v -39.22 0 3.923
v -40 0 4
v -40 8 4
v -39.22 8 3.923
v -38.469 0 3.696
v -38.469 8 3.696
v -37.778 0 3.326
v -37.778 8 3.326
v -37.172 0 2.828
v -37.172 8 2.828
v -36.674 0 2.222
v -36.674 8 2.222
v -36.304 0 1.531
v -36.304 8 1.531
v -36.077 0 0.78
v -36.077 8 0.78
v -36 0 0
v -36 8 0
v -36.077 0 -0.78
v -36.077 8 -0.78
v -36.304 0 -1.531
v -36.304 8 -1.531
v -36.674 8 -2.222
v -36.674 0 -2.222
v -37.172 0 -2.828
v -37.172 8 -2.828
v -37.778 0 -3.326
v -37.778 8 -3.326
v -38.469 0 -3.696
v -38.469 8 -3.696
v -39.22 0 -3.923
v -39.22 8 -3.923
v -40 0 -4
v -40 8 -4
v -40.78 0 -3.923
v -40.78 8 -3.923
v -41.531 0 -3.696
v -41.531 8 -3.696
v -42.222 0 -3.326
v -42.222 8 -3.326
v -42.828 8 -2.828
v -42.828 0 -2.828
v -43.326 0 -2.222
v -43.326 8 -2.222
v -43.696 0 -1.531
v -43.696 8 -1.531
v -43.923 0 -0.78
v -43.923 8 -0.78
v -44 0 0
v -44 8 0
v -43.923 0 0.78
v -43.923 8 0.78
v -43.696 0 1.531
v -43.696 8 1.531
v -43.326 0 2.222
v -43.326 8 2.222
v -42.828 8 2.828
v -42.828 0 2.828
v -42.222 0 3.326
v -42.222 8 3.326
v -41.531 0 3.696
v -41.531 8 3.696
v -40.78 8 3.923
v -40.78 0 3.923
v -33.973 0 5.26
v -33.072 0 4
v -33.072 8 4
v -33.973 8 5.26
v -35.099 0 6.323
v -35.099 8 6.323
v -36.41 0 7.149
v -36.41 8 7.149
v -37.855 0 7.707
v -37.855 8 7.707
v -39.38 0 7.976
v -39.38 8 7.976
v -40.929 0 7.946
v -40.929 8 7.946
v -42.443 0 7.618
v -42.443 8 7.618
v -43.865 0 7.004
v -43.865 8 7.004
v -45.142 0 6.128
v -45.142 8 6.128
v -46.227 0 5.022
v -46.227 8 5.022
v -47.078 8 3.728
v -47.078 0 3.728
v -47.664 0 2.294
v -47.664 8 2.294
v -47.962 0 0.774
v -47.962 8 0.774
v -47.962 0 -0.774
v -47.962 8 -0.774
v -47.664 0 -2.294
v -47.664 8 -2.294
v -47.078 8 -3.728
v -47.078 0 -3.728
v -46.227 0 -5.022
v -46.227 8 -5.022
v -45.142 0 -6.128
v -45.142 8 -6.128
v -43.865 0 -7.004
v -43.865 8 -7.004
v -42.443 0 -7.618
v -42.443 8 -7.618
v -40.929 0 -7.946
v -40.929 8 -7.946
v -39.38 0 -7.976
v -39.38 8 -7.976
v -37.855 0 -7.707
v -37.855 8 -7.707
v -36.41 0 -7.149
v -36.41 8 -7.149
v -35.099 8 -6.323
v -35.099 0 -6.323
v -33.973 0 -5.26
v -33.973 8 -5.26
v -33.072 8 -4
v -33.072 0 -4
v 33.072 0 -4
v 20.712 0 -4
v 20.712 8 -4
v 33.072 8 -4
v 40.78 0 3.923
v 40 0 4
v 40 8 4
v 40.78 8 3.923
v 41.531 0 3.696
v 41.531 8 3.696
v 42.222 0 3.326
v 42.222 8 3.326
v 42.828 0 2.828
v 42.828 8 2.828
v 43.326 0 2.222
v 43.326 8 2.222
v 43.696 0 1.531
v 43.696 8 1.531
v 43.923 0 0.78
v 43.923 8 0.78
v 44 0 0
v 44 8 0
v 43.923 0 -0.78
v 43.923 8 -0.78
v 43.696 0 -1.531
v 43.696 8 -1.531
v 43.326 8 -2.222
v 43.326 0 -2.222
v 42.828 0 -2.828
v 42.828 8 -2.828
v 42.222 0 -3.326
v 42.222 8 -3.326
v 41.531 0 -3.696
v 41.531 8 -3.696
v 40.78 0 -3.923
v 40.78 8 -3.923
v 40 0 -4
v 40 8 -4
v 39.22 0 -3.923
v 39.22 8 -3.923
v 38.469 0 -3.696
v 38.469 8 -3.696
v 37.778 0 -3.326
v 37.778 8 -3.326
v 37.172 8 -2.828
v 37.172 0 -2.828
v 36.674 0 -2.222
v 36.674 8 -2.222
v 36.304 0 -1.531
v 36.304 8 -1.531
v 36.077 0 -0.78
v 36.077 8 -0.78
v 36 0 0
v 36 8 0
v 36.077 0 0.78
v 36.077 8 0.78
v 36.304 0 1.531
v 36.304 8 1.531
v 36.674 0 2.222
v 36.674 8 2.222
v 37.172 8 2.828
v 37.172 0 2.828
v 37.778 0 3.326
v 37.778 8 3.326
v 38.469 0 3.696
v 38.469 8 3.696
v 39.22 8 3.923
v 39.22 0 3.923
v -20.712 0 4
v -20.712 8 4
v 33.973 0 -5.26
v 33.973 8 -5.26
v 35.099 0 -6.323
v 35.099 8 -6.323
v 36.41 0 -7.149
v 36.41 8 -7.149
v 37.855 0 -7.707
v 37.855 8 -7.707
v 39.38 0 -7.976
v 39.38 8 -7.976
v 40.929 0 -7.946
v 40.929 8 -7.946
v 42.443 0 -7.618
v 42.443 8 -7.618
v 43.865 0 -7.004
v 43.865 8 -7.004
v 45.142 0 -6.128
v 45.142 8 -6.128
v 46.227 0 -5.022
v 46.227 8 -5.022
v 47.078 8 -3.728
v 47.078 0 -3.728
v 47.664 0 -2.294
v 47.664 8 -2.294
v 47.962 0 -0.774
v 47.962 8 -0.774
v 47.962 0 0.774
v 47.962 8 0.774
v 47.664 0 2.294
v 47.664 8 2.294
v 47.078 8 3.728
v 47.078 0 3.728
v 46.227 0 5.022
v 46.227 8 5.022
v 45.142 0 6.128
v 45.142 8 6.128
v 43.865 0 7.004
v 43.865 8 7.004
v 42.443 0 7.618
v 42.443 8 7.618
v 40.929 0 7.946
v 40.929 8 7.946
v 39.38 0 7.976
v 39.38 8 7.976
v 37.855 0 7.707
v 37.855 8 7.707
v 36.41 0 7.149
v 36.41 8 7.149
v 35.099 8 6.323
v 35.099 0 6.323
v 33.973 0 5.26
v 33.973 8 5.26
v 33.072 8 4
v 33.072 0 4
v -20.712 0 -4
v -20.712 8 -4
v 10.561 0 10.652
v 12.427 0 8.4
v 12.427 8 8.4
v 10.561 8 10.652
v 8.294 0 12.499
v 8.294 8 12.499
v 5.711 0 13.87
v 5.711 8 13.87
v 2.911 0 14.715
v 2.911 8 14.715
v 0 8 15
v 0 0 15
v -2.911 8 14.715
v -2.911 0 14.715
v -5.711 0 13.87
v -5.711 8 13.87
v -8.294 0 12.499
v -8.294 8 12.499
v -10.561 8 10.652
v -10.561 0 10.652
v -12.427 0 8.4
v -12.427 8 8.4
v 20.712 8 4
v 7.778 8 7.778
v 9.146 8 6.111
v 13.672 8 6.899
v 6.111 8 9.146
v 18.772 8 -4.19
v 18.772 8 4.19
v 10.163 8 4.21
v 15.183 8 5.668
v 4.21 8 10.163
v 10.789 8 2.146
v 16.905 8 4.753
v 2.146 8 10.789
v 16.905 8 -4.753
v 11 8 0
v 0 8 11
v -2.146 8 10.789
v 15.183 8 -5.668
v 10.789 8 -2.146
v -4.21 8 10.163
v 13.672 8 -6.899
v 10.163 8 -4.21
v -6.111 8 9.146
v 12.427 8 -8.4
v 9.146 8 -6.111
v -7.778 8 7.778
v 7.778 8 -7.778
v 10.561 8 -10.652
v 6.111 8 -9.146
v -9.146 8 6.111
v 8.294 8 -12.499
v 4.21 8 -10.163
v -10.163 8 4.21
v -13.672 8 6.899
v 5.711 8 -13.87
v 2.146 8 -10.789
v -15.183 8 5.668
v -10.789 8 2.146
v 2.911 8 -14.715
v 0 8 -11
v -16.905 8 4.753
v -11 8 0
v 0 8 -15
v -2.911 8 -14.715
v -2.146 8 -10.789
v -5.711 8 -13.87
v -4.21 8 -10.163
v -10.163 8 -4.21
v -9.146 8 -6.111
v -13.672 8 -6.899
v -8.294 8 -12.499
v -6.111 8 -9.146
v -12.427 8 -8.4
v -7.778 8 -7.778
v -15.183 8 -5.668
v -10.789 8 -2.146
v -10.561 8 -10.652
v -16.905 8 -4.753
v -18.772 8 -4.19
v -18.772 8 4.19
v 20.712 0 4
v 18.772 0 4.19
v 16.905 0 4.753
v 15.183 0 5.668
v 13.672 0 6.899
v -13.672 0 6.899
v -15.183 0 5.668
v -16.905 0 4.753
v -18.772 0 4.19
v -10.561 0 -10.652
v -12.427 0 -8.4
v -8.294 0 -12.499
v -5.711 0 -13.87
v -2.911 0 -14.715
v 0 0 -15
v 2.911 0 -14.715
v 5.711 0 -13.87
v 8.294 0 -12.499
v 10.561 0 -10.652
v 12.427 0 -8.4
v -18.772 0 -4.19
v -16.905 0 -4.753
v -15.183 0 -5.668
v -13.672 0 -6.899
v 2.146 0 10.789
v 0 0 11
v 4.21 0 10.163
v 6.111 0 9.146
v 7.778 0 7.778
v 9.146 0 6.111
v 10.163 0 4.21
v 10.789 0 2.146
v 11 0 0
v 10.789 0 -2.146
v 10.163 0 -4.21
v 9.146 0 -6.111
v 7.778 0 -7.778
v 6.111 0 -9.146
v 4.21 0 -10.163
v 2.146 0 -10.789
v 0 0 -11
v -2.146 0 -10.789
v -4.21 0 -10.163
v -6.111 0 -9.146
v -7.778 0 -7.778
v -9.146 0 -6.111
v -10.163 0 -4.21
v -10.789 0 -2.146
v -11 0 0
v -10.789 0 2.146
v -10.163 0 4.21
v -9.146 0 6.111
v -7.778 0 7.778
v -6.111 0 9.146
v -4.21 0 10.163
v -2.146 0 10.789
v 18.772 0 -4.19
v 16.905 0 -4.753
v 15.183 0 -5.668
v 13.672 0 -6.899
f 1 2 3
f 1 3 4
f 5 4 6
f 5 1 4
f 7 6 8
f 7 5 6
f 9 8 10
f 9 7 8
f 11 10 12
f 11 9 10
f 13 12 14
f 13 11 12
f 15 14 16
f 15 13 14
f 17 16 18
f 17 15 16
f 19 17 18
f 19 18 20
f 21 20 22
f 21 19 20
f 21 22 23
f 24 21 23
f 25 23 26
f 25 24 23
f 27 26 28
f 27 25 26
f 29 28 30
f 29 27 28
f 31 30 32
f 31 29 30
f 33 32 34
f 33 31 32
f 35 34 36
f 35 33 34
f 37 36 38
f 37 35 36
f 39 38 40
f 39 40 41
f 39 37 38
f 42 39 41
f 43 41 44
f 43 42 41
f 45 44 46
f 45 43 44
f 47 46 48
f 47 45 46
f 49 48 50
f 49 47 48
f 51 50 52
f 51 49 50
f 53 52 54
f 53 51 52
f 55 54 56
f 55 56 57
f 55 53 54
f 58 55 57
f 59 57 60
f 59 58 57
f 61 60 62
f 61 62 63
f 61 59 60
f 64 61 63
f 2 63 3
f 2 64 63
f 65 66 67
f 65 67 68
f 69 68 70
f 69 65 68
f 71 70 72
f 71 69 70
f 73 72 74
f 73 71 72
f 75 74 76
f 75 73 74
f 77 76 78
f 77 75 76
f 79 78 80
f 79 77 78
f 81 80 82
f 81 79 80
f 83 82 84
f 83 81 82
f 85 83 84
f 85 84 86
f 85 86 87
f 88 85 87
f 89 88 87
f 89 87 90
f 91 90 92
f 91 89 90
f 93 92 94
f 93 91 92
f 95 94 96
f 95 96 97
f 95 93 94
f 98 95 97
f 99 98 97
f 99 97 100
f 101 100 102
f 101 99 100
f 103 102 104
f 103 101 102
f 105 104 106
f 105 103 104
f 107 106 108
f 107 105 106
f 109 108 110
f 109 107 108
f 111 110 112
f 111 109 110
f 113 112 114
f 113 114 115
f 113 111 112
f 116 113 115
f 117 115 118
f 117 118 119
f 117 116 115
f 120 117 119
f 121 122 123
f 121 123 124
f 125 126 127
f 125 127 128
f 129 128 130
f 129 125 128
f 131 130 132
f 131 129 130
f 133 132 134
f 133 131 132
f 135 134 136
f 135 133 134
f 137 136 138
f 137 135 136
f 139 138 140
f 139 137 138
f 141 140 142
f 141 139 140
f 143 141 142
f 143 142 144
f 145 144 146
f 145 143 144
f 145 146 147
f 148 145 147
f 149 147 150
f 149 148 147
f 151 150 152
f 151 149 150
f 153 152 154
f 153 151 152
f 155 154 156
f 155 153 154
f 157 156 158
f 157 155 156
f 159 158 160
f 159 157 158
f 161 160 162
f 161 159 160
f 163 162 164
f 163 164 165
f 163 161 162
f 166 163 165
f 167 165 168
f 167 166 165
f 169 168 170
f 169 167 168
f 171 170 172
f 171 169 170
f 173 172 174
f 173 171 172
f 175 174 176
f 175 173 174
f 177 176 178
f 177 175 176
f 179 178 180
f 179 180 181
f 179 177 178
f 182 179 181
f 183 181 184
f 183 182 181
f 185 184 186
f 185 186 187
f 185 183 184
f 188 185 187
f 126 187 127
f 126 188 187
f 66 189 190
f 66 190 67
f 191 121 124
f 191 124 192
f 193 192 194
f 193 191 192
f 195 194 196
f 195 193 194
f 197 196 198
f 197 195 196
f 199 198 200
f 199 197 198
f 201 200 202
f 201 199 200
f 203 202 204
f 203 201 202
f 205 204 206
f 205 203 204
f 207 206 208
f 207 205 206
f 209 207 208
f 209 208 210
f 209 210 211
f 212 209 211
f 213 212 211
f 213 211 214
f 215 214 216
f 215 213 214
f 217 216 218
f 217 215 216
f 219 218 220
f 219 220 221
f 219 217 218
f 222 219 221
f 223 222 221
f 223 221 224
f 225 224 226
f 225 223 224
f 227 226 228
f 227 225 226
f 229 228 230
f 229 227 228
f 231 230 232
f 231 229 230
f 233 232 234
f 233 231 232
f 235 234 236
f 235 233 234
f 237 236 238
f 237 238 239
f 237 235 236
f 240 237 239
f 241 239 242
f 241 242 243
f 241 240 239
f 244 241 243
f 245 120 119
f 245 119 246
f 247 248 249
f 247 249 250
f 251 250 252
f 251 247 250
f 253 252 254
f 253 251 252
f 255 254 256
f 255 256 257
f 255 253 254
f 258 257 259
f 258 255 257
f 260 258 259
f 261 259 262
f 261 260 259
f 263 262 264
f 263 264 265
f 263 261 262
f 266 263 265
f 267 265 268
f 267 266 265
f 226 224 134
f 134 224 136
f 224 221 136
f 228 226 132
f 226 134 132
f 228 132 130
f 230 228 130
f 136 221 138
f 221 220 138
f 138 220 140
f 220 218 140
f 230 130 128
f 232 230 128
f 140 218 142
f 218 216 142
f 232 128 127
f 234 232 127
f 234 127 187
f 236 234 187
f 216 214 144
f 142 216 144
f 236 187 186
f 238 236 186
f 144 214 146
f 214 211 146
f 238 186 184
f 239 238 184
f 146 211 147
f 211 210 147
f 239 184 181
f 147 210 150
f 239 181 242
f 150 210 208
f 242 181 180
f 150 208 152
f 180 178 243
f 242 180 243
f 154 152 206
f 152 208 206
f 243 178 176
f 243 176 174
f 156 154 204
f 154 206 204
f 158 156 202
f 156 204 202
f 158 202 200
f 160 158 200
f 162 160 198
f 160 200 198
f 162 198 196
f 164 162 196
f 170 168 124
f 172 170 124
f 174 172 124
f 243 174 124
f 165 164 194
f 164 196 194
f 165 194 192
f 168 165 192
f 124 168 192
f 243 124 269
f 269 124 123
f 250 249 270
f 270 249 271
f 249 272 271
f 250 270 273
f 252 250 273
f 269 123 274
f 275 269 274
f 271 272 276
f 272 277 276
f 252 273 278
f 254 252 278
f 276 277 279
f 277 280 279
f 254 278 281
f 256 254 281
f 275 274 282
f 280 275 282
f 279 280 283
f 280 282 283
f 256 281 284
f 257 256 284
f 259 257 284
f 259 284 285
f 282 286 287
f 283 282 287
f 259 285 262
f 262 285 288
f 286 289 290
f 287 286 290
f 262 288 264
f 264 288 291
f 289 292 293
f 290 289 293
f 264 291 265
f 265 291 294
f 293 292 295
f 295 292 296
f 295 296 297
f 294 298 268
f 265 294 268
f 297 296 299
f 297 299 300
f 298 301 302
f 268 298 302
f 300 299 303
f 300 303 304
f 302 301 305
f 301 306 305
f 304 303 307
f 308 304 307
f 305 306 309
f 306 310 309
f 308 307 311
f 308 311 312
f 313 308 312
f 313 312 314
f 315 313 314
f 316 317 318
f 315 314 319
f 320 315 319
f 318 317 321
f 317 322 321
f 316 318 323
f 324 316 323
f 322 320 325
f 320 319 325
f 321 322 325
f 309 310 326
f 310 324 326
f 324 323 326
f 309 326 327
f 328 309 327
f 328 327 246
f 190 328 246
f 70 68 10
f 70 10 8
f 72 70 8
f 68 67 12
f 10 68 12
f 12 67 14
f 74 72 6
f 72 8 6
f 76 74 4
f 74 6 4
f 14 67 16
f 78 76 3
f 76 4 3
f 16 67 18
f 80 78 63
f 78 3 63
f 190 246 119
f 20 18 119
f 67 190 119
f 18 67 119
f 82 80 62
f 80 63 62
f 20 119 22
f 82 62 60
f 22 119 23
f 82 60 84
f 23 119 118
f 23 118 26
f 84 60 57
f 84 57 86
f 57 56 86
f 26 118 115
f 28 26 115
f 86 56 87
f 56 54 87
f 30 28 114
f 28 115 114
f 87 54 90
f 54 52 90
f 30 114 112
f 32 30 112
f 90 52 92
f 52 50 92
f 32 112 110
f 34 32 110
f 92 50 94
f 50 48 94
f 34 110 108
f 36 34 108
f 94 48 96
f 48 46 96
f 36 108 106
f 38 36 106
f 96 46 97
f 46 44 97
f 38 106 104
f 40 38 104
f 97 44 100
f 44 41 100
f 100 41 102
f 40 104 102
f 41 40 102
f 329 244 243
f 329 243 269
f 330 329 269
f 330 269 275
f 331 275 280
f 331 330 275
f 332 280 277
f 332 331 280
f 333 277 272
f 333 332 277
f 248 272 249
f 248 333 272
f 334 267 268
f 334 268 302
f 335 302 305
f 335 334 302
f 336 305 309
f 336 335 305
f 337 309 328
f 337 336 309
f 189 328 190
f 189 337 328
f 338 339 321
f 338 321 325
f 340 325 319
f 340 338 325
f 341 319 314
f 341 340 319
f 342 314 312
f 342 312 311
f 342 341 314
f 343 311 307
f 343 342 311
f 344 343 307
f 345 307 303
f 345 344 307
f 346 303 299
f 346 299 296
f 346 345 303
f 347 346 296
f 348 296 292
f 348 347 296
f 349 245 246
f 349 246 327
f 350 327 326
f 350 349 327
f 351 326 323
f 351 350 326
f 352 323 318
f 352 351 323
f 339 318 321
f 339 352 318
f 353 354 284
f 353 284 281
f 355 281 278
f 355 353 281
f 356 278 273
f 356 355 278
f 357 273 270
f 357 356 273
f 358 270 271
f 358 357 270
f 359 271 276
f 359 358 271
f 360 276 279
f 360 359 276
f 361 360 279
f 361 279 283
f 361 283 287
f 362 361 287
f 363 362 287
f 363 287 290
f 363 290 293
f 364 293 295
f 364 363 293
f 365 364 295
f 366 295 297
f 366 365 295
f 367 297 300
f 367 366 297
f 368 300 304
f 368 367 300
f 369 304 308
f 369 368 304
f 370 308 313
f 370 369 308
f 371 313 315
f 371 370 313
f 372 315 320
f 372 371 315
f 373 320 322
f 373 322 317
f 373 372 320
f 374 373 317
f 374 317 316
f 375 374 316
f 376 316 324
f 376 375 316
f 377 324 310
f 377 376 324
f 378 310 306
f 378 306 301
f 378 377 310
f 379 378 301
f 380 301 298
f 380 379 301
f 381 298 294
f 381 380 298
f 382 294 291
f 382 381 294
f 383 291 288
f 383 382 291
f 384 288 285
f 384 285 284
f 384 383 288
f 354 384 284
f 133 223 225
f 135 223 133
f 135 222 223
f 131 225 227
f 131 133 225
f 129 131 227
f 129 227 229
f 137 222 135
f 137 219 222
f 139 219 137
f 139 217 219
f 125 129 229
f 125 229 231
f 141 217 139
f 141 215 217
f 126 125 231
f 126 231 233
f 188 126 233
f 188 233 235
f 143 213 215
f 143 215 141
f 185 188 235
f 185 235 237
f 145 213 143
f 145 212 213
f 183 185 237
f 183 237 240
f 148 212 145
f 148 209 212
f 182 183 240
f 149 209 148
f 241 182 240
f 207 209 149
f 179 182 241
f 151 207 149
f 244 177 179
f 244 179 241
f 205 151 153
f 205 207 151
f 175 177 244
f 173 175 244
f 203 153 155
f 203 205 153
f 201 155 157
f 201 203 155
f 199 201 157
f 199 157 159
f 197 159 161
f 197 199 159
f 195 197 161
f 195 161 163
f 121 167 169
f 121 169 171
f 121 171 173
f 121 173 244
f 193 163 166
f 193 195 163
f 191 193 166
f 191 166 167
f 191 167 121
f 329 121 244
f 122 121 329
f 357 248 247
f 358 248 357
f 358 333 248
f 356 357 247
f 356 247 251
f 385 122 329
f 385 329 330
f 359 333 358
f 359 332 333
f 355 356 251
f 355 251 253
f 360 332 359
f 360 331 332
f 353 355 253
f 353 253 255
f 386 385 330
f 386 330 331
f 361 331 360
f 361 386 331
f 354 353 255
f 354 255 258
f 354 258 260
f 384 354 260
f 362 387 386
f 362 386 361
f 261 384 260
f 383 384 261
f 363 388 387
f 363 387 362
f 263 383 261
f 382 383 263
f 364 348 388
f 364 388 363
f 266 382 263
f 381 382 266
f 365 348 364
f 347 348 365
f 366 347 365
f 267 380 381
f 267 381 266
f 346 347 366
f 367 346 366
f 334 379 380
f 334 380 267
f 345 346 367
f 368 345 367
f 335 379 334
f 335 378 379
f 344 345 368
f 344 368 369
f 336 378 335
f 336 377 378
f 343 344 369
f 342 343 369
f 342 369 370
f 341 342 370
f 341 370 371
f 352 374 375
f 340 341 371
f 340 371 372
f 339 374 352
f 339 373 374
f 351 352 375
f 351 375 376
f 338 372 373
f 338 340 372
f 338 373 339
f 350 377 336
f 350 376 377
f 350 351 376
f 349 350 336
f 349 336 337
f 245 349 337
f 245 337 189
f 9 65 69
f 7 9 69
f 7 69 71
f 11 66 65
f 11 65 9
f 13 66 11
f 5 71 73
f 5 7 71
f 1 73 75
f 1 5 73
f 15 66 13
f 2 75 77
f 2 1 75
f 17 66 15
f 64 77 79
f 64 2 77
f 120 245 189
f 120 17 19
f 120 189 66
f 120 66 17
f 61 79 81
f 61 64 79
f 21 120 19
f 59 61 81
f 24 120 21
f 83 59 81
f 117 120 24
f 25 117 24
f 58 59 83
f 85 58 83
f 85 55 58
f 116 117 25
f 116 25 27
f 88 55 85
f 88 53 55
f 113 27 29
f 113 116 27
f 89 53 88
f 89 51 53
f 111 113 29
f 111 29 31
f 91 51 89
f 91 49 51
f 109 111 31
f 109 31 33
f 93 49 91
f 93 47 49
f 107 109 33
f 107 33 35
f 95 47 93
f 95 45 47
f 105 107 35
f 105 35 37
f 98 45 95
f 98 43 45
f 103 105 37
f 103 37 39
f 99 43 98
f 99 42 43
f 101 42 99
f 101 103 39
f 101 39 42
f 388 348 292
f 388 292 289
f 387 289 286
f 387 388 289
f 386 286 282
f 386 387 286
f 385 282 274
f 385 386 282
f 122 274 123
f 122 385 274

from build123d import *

# Parameters (mm, degrees)
ESBO_O1_R                = 4
ESBO_O1_R_2              = 11
RESSALTO_EXTRUS_O1_DEPTH = 8


with BuildPart() as part:
    # Esboço1 → Ressalto-extrusão1 (new body)
    with BuildSketch(Plane(origin=(0, 0, 0), x_dir=(1, 0, 0), z_dir=(0, 1, 0))):
        with BuildLine():
            Line((-33.07179677, 4), (-20.712315177, 4))
            ThreePointArc((-20.712315177, 4), (-16.021899417, 5.168239134), (-12.427389106, 8.4))
            ThreePointArc((-12.427389106, 8.4), (0, 15), (12.427389106, 8.4))
            ThreePointArc((12.427389106, 8.4), (16.021899417, 5.168239134), (20.712315177, 4))
            Line((20.712315177, 4), (33.07179677, 4))
            ThreePointArc((33.07179677, 4), (48, 0), (33.07179677, -4))
            Line((33.07179677, -4), (20.712315177, -4))
            ThreePointArc((20.712315177, -4), (16.021899417, -5.168239134), (12.427389106, -8.4))
            ThreePointArc((12.427389106, -8.4), (0, -15), (-12.427389106, -8.4))
            ThreePointArc((-12.427389106, -8.4), (-16.021899417, -5.168239134), (-20.712315177, -4))
            Line((-20.712315177, -4), (-33.07179677, -4))
            ThreePointArc((-33.07179677, -4), (-48, 0), (-33.07179677, 4))
        make_face()
        with Locations(Location((40, 0, 0), (0, 0, 270))):
            Circle(ESBO_O1_R, mode=Mode.SUBTRACT)
        with Locations(Location((-40, 0, 0), (0, 0, 270))):
            Circle(ESBO_O1_R, mode=Mode.SUBTRACT)
        with Locations(Location((0, 0, 0), (0, 0, 270))):
            Circle(ESBO_O1_R_2, mode=Mode.SUBTRACT)
    extrude(amount=RESSALTO_EXTRUS_O1_DEPTH)


solid = part.part
